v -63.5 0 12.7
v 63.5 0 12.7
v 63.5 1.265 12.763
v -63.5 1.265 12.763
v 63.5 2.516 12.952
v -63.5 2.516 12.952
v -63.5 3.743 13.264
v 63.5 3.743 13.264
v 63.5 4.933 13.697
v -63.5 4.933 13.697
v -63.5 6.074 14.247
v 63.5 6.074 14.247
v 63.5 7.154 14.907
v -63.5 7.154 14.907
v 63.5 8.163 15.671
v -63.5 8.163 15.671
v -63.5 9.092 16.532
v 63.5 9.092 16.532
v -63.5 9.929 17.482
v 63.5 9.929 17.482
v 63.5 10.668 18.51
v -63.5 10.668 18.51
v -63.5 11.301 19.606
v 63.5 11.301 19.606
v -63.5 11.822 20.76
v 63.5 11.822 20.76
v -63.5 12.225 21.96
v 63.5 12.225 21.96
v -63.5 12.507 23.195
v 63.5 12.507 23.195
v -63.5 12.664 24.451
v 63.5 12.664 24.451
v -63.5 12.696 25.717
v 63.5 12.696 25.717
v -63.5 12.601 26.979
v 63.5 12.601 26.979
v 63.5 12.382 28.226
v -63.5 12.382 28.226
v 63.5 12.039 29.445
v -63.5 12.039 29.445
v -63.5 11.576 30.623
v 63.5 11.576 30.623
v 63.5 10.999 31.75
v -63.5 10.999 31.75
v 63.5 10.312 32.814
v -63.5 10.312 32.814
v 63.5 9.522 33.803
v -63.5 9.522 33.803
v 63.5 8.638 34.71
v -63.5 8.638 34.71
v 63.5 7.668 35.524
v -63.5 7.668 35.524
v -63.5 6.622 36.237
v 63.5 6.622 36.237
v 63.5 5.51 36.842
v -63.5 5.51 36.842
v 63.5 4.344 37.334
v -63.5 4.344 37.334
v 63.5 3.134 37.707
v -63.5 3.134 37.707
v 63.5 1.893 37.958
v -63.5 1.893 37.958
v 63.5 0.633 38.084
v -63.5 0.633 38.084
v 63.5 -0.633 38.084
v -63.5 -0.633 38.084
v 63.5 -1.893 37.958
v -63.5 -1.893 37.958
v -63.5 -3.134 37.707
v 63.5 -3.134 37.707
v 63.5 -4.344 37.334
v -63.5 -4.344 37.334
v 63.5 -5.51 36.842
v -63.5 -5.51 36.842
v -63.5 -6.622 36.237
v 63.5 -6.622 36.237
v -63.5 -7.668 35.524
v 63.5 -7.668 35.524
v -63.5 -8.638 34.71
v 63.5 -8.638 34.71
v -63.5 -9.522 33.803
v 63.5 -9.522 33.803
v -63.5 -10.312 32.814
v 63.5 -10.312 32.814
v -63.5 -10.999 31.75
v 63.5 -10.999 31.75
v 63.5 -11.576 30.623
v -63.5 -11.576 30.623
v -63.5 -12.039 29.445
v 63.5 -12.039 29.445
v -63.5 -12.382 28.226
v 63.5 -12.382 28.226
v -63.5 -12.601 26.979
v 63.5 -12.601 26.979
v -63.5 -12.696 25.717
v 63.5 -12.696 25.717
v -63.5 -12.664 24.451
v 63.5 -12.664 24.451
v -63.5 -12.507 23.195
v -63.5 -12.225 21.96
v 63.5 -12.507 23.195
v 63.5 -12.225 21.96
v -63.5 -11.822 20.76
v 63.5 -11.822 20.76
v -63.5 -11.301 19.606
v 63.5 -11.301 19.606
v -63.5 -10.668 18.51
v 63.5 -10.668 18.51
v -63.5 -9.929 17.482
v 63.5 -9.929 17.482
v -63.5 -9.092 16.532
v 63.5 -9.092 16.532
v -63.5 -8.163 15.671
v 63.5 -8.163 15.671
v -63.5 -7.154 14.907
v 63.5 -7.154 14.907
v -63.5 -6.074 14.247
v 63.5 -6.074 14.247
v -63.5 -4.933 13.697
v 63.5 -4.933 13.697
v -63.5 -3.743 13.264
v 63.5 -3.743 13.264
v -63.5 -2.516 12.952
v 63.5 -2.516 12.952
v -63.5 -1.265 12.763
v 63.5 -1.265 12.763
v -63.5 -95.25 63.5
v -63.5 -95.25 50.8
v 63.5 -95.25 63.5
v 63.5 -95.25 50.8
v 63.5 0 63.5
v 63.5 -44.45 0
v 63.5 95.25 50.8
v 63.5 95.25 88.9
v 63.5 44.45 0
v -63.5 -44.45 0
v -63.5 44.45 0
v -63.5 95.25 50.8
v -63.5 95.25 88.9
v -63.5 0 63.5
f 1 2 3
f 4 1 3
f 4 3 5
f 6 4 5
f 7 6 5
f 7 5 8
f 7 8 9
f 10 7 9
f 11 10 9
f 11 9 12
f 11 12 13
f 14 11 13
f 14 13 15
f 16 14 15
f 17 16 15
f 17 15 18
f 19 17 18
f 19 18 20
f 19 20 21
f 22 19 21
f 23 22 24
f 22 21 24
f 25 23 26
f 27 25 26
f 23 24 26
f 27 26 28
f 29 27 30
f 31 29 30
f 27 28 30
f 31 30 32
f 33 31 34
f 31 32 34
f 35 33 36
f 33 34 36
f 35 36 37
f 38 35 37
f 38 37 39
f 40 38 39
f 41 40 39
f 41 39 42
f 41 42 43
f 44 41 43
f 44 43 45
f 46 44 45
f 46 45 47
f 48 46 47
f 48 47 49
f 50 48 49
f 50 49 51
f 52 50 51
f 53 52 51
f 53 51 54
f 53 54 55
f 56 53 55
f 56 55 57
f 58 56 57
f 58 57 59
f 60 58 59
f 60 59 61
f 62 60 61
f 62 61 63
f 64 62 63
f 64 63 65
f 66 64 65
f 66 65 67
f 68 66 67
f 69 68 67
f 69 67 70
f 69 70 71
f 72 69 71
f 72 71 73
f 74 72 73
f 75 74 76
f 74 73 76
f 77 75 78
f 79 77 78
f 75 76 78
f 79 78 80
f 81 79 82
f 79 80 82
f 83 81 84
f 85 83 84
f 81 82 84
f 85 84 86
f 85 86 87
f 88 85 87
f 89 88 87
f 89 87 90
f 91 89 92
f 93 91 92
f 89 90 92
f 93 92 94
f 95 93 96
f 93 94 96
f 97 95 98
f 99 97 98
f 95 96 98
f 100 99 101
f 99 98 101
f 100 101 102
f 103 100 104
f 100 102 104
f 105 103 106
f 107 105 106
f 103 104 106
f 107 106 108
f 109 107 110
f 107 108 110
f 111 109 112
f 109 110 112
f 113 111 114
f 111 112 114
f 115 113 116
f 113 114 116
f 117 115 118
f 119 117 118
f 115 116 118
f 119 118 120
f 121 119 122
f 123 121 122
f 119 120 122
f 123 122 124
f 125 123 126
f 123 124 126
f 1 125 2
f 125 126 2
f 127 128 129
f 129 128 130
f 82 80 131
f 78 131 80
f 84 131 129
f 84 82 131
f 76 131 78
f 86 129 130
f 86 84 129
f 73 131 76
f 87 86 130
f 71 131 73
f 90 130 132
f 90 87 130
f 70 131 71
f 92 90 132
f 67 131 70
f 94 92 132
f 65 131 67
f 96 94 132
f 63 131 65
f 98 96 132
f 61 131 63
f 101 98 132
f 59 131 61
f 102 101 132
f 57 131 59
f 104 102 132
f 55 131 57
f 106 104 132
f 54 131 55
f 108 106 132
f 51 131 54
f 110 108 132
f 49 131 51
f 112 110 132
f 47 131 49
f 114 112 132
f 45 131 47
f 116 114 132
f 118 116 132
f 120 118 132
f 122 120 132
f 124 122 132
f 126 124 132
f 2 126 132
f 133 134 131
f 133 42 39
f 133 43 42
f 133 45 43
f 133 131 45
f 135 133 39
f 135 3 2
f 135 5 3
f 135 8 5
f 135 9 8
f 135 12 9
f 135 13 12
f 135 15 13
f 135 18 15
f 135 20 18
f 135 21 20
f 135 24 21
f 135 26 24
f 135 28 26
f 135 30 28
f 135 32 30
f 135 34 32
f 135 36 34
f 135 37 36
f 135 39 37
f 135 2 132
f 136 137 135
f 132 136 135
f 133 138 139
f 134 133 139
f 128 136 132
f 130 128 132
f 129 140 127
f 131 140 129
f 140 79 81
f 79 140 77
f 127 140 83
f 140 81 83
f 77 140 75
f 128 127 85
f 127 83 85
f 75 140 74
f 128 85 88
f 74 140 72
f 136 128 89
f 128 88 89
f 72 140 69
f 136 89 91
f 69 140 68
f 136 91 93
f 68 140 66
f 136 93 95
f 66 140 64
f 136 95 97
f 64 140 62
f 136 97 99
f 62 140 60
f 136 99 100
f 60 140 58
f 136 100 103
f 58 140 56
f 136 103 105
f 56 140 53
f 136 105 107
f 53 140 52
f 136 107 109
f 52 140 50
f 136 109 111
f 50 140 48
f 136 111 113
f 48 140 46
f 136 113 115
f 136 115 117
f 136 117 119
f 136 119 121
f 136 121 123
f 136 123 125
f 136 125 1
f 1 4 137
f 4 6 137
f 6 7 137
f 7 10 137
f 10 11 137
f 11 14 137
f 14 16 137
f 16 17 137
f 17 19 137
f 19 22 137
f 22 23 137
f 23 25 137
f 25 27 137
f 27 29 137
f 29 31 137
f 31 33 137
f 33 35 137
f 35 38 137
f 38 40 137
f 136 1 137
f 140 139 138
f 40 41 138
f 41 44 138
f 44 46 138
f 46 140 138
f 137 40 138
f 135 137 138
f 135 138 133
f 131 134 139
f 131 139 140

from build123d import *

# Parameters (mm, degrees)
SKETCH1_W           = 127
SKETCH1_H           = 190.5
BOSS_EXTRUDE1_DEPTH = 63.5
SKETCH4_W           = 127
SKETCH4_H           = 71.842048968
CUT_EXTRUDE1_DEPTH  = 63.5
SKETCH5_R           = 12.7
CUT_EXTRUDE2_DEPTH  = 137.16
BOSS_EXTRUDE2_DEPTH = 127


with BuildPart() as part:
    # Sketch1 → Boss-Extrude1 (new body)
    with BuildSketch(Plane.XY):
        Rectangle(SKETCH1_W, SKETCH1_H)
    extrude(amount=BOSS_EXTRUDE1_DEPTH)

    # Sketch4 → Cut-Extrude1 (cut)
    with BuildSketch(Plane(origin=(0, -22.225, -22.225), x_dir=(1, 0, 0), z_dir=(0, 0.7071067811865477, 0.7071067811865475))):
        with Locations((0, -67.351920908)):
            Rectangle(SKETCH4_W, SKETCH4_H)
    cut_extrude1 = extrude(amount=-CUT_EXTRUDE1_DEPTH, mode=Mode.SUBTRACT)

    # Sketch5 → Cut-Extrude2 (cut)
    with BuildSketch(Plane(origin=(63.5, 0, 0), x_dir=(0, 0, -1), z_dir=(1, 0, 0))):
        with Locations((-25.4, 0)):
            Circle(SKETCH5_R)
    extrude(amount=-CUT_EXTRUDE2_DEPTH, mode=Mode.SUBTRACT)

    # Mirror1: Cut-Extrude1 across plane
    add(cut_extrude1.mirror(Plane.ZX), mode=Mode.SUBTRACT)

    # Sketch7 → Boss-Extrude2 (add)
    with BuildSketch(Plane(origin=(63.5, 0, 0), x_dir=(0, 0, -1), z_dir=(1, 0, 0))):
        Polygon((-63.5, 95.25), (-88.9, 95.25), (-63.5, 0), align=None)
    extrude(amount=-BOSS_EXTRUDE2_DEPTH)


solid = part.part
